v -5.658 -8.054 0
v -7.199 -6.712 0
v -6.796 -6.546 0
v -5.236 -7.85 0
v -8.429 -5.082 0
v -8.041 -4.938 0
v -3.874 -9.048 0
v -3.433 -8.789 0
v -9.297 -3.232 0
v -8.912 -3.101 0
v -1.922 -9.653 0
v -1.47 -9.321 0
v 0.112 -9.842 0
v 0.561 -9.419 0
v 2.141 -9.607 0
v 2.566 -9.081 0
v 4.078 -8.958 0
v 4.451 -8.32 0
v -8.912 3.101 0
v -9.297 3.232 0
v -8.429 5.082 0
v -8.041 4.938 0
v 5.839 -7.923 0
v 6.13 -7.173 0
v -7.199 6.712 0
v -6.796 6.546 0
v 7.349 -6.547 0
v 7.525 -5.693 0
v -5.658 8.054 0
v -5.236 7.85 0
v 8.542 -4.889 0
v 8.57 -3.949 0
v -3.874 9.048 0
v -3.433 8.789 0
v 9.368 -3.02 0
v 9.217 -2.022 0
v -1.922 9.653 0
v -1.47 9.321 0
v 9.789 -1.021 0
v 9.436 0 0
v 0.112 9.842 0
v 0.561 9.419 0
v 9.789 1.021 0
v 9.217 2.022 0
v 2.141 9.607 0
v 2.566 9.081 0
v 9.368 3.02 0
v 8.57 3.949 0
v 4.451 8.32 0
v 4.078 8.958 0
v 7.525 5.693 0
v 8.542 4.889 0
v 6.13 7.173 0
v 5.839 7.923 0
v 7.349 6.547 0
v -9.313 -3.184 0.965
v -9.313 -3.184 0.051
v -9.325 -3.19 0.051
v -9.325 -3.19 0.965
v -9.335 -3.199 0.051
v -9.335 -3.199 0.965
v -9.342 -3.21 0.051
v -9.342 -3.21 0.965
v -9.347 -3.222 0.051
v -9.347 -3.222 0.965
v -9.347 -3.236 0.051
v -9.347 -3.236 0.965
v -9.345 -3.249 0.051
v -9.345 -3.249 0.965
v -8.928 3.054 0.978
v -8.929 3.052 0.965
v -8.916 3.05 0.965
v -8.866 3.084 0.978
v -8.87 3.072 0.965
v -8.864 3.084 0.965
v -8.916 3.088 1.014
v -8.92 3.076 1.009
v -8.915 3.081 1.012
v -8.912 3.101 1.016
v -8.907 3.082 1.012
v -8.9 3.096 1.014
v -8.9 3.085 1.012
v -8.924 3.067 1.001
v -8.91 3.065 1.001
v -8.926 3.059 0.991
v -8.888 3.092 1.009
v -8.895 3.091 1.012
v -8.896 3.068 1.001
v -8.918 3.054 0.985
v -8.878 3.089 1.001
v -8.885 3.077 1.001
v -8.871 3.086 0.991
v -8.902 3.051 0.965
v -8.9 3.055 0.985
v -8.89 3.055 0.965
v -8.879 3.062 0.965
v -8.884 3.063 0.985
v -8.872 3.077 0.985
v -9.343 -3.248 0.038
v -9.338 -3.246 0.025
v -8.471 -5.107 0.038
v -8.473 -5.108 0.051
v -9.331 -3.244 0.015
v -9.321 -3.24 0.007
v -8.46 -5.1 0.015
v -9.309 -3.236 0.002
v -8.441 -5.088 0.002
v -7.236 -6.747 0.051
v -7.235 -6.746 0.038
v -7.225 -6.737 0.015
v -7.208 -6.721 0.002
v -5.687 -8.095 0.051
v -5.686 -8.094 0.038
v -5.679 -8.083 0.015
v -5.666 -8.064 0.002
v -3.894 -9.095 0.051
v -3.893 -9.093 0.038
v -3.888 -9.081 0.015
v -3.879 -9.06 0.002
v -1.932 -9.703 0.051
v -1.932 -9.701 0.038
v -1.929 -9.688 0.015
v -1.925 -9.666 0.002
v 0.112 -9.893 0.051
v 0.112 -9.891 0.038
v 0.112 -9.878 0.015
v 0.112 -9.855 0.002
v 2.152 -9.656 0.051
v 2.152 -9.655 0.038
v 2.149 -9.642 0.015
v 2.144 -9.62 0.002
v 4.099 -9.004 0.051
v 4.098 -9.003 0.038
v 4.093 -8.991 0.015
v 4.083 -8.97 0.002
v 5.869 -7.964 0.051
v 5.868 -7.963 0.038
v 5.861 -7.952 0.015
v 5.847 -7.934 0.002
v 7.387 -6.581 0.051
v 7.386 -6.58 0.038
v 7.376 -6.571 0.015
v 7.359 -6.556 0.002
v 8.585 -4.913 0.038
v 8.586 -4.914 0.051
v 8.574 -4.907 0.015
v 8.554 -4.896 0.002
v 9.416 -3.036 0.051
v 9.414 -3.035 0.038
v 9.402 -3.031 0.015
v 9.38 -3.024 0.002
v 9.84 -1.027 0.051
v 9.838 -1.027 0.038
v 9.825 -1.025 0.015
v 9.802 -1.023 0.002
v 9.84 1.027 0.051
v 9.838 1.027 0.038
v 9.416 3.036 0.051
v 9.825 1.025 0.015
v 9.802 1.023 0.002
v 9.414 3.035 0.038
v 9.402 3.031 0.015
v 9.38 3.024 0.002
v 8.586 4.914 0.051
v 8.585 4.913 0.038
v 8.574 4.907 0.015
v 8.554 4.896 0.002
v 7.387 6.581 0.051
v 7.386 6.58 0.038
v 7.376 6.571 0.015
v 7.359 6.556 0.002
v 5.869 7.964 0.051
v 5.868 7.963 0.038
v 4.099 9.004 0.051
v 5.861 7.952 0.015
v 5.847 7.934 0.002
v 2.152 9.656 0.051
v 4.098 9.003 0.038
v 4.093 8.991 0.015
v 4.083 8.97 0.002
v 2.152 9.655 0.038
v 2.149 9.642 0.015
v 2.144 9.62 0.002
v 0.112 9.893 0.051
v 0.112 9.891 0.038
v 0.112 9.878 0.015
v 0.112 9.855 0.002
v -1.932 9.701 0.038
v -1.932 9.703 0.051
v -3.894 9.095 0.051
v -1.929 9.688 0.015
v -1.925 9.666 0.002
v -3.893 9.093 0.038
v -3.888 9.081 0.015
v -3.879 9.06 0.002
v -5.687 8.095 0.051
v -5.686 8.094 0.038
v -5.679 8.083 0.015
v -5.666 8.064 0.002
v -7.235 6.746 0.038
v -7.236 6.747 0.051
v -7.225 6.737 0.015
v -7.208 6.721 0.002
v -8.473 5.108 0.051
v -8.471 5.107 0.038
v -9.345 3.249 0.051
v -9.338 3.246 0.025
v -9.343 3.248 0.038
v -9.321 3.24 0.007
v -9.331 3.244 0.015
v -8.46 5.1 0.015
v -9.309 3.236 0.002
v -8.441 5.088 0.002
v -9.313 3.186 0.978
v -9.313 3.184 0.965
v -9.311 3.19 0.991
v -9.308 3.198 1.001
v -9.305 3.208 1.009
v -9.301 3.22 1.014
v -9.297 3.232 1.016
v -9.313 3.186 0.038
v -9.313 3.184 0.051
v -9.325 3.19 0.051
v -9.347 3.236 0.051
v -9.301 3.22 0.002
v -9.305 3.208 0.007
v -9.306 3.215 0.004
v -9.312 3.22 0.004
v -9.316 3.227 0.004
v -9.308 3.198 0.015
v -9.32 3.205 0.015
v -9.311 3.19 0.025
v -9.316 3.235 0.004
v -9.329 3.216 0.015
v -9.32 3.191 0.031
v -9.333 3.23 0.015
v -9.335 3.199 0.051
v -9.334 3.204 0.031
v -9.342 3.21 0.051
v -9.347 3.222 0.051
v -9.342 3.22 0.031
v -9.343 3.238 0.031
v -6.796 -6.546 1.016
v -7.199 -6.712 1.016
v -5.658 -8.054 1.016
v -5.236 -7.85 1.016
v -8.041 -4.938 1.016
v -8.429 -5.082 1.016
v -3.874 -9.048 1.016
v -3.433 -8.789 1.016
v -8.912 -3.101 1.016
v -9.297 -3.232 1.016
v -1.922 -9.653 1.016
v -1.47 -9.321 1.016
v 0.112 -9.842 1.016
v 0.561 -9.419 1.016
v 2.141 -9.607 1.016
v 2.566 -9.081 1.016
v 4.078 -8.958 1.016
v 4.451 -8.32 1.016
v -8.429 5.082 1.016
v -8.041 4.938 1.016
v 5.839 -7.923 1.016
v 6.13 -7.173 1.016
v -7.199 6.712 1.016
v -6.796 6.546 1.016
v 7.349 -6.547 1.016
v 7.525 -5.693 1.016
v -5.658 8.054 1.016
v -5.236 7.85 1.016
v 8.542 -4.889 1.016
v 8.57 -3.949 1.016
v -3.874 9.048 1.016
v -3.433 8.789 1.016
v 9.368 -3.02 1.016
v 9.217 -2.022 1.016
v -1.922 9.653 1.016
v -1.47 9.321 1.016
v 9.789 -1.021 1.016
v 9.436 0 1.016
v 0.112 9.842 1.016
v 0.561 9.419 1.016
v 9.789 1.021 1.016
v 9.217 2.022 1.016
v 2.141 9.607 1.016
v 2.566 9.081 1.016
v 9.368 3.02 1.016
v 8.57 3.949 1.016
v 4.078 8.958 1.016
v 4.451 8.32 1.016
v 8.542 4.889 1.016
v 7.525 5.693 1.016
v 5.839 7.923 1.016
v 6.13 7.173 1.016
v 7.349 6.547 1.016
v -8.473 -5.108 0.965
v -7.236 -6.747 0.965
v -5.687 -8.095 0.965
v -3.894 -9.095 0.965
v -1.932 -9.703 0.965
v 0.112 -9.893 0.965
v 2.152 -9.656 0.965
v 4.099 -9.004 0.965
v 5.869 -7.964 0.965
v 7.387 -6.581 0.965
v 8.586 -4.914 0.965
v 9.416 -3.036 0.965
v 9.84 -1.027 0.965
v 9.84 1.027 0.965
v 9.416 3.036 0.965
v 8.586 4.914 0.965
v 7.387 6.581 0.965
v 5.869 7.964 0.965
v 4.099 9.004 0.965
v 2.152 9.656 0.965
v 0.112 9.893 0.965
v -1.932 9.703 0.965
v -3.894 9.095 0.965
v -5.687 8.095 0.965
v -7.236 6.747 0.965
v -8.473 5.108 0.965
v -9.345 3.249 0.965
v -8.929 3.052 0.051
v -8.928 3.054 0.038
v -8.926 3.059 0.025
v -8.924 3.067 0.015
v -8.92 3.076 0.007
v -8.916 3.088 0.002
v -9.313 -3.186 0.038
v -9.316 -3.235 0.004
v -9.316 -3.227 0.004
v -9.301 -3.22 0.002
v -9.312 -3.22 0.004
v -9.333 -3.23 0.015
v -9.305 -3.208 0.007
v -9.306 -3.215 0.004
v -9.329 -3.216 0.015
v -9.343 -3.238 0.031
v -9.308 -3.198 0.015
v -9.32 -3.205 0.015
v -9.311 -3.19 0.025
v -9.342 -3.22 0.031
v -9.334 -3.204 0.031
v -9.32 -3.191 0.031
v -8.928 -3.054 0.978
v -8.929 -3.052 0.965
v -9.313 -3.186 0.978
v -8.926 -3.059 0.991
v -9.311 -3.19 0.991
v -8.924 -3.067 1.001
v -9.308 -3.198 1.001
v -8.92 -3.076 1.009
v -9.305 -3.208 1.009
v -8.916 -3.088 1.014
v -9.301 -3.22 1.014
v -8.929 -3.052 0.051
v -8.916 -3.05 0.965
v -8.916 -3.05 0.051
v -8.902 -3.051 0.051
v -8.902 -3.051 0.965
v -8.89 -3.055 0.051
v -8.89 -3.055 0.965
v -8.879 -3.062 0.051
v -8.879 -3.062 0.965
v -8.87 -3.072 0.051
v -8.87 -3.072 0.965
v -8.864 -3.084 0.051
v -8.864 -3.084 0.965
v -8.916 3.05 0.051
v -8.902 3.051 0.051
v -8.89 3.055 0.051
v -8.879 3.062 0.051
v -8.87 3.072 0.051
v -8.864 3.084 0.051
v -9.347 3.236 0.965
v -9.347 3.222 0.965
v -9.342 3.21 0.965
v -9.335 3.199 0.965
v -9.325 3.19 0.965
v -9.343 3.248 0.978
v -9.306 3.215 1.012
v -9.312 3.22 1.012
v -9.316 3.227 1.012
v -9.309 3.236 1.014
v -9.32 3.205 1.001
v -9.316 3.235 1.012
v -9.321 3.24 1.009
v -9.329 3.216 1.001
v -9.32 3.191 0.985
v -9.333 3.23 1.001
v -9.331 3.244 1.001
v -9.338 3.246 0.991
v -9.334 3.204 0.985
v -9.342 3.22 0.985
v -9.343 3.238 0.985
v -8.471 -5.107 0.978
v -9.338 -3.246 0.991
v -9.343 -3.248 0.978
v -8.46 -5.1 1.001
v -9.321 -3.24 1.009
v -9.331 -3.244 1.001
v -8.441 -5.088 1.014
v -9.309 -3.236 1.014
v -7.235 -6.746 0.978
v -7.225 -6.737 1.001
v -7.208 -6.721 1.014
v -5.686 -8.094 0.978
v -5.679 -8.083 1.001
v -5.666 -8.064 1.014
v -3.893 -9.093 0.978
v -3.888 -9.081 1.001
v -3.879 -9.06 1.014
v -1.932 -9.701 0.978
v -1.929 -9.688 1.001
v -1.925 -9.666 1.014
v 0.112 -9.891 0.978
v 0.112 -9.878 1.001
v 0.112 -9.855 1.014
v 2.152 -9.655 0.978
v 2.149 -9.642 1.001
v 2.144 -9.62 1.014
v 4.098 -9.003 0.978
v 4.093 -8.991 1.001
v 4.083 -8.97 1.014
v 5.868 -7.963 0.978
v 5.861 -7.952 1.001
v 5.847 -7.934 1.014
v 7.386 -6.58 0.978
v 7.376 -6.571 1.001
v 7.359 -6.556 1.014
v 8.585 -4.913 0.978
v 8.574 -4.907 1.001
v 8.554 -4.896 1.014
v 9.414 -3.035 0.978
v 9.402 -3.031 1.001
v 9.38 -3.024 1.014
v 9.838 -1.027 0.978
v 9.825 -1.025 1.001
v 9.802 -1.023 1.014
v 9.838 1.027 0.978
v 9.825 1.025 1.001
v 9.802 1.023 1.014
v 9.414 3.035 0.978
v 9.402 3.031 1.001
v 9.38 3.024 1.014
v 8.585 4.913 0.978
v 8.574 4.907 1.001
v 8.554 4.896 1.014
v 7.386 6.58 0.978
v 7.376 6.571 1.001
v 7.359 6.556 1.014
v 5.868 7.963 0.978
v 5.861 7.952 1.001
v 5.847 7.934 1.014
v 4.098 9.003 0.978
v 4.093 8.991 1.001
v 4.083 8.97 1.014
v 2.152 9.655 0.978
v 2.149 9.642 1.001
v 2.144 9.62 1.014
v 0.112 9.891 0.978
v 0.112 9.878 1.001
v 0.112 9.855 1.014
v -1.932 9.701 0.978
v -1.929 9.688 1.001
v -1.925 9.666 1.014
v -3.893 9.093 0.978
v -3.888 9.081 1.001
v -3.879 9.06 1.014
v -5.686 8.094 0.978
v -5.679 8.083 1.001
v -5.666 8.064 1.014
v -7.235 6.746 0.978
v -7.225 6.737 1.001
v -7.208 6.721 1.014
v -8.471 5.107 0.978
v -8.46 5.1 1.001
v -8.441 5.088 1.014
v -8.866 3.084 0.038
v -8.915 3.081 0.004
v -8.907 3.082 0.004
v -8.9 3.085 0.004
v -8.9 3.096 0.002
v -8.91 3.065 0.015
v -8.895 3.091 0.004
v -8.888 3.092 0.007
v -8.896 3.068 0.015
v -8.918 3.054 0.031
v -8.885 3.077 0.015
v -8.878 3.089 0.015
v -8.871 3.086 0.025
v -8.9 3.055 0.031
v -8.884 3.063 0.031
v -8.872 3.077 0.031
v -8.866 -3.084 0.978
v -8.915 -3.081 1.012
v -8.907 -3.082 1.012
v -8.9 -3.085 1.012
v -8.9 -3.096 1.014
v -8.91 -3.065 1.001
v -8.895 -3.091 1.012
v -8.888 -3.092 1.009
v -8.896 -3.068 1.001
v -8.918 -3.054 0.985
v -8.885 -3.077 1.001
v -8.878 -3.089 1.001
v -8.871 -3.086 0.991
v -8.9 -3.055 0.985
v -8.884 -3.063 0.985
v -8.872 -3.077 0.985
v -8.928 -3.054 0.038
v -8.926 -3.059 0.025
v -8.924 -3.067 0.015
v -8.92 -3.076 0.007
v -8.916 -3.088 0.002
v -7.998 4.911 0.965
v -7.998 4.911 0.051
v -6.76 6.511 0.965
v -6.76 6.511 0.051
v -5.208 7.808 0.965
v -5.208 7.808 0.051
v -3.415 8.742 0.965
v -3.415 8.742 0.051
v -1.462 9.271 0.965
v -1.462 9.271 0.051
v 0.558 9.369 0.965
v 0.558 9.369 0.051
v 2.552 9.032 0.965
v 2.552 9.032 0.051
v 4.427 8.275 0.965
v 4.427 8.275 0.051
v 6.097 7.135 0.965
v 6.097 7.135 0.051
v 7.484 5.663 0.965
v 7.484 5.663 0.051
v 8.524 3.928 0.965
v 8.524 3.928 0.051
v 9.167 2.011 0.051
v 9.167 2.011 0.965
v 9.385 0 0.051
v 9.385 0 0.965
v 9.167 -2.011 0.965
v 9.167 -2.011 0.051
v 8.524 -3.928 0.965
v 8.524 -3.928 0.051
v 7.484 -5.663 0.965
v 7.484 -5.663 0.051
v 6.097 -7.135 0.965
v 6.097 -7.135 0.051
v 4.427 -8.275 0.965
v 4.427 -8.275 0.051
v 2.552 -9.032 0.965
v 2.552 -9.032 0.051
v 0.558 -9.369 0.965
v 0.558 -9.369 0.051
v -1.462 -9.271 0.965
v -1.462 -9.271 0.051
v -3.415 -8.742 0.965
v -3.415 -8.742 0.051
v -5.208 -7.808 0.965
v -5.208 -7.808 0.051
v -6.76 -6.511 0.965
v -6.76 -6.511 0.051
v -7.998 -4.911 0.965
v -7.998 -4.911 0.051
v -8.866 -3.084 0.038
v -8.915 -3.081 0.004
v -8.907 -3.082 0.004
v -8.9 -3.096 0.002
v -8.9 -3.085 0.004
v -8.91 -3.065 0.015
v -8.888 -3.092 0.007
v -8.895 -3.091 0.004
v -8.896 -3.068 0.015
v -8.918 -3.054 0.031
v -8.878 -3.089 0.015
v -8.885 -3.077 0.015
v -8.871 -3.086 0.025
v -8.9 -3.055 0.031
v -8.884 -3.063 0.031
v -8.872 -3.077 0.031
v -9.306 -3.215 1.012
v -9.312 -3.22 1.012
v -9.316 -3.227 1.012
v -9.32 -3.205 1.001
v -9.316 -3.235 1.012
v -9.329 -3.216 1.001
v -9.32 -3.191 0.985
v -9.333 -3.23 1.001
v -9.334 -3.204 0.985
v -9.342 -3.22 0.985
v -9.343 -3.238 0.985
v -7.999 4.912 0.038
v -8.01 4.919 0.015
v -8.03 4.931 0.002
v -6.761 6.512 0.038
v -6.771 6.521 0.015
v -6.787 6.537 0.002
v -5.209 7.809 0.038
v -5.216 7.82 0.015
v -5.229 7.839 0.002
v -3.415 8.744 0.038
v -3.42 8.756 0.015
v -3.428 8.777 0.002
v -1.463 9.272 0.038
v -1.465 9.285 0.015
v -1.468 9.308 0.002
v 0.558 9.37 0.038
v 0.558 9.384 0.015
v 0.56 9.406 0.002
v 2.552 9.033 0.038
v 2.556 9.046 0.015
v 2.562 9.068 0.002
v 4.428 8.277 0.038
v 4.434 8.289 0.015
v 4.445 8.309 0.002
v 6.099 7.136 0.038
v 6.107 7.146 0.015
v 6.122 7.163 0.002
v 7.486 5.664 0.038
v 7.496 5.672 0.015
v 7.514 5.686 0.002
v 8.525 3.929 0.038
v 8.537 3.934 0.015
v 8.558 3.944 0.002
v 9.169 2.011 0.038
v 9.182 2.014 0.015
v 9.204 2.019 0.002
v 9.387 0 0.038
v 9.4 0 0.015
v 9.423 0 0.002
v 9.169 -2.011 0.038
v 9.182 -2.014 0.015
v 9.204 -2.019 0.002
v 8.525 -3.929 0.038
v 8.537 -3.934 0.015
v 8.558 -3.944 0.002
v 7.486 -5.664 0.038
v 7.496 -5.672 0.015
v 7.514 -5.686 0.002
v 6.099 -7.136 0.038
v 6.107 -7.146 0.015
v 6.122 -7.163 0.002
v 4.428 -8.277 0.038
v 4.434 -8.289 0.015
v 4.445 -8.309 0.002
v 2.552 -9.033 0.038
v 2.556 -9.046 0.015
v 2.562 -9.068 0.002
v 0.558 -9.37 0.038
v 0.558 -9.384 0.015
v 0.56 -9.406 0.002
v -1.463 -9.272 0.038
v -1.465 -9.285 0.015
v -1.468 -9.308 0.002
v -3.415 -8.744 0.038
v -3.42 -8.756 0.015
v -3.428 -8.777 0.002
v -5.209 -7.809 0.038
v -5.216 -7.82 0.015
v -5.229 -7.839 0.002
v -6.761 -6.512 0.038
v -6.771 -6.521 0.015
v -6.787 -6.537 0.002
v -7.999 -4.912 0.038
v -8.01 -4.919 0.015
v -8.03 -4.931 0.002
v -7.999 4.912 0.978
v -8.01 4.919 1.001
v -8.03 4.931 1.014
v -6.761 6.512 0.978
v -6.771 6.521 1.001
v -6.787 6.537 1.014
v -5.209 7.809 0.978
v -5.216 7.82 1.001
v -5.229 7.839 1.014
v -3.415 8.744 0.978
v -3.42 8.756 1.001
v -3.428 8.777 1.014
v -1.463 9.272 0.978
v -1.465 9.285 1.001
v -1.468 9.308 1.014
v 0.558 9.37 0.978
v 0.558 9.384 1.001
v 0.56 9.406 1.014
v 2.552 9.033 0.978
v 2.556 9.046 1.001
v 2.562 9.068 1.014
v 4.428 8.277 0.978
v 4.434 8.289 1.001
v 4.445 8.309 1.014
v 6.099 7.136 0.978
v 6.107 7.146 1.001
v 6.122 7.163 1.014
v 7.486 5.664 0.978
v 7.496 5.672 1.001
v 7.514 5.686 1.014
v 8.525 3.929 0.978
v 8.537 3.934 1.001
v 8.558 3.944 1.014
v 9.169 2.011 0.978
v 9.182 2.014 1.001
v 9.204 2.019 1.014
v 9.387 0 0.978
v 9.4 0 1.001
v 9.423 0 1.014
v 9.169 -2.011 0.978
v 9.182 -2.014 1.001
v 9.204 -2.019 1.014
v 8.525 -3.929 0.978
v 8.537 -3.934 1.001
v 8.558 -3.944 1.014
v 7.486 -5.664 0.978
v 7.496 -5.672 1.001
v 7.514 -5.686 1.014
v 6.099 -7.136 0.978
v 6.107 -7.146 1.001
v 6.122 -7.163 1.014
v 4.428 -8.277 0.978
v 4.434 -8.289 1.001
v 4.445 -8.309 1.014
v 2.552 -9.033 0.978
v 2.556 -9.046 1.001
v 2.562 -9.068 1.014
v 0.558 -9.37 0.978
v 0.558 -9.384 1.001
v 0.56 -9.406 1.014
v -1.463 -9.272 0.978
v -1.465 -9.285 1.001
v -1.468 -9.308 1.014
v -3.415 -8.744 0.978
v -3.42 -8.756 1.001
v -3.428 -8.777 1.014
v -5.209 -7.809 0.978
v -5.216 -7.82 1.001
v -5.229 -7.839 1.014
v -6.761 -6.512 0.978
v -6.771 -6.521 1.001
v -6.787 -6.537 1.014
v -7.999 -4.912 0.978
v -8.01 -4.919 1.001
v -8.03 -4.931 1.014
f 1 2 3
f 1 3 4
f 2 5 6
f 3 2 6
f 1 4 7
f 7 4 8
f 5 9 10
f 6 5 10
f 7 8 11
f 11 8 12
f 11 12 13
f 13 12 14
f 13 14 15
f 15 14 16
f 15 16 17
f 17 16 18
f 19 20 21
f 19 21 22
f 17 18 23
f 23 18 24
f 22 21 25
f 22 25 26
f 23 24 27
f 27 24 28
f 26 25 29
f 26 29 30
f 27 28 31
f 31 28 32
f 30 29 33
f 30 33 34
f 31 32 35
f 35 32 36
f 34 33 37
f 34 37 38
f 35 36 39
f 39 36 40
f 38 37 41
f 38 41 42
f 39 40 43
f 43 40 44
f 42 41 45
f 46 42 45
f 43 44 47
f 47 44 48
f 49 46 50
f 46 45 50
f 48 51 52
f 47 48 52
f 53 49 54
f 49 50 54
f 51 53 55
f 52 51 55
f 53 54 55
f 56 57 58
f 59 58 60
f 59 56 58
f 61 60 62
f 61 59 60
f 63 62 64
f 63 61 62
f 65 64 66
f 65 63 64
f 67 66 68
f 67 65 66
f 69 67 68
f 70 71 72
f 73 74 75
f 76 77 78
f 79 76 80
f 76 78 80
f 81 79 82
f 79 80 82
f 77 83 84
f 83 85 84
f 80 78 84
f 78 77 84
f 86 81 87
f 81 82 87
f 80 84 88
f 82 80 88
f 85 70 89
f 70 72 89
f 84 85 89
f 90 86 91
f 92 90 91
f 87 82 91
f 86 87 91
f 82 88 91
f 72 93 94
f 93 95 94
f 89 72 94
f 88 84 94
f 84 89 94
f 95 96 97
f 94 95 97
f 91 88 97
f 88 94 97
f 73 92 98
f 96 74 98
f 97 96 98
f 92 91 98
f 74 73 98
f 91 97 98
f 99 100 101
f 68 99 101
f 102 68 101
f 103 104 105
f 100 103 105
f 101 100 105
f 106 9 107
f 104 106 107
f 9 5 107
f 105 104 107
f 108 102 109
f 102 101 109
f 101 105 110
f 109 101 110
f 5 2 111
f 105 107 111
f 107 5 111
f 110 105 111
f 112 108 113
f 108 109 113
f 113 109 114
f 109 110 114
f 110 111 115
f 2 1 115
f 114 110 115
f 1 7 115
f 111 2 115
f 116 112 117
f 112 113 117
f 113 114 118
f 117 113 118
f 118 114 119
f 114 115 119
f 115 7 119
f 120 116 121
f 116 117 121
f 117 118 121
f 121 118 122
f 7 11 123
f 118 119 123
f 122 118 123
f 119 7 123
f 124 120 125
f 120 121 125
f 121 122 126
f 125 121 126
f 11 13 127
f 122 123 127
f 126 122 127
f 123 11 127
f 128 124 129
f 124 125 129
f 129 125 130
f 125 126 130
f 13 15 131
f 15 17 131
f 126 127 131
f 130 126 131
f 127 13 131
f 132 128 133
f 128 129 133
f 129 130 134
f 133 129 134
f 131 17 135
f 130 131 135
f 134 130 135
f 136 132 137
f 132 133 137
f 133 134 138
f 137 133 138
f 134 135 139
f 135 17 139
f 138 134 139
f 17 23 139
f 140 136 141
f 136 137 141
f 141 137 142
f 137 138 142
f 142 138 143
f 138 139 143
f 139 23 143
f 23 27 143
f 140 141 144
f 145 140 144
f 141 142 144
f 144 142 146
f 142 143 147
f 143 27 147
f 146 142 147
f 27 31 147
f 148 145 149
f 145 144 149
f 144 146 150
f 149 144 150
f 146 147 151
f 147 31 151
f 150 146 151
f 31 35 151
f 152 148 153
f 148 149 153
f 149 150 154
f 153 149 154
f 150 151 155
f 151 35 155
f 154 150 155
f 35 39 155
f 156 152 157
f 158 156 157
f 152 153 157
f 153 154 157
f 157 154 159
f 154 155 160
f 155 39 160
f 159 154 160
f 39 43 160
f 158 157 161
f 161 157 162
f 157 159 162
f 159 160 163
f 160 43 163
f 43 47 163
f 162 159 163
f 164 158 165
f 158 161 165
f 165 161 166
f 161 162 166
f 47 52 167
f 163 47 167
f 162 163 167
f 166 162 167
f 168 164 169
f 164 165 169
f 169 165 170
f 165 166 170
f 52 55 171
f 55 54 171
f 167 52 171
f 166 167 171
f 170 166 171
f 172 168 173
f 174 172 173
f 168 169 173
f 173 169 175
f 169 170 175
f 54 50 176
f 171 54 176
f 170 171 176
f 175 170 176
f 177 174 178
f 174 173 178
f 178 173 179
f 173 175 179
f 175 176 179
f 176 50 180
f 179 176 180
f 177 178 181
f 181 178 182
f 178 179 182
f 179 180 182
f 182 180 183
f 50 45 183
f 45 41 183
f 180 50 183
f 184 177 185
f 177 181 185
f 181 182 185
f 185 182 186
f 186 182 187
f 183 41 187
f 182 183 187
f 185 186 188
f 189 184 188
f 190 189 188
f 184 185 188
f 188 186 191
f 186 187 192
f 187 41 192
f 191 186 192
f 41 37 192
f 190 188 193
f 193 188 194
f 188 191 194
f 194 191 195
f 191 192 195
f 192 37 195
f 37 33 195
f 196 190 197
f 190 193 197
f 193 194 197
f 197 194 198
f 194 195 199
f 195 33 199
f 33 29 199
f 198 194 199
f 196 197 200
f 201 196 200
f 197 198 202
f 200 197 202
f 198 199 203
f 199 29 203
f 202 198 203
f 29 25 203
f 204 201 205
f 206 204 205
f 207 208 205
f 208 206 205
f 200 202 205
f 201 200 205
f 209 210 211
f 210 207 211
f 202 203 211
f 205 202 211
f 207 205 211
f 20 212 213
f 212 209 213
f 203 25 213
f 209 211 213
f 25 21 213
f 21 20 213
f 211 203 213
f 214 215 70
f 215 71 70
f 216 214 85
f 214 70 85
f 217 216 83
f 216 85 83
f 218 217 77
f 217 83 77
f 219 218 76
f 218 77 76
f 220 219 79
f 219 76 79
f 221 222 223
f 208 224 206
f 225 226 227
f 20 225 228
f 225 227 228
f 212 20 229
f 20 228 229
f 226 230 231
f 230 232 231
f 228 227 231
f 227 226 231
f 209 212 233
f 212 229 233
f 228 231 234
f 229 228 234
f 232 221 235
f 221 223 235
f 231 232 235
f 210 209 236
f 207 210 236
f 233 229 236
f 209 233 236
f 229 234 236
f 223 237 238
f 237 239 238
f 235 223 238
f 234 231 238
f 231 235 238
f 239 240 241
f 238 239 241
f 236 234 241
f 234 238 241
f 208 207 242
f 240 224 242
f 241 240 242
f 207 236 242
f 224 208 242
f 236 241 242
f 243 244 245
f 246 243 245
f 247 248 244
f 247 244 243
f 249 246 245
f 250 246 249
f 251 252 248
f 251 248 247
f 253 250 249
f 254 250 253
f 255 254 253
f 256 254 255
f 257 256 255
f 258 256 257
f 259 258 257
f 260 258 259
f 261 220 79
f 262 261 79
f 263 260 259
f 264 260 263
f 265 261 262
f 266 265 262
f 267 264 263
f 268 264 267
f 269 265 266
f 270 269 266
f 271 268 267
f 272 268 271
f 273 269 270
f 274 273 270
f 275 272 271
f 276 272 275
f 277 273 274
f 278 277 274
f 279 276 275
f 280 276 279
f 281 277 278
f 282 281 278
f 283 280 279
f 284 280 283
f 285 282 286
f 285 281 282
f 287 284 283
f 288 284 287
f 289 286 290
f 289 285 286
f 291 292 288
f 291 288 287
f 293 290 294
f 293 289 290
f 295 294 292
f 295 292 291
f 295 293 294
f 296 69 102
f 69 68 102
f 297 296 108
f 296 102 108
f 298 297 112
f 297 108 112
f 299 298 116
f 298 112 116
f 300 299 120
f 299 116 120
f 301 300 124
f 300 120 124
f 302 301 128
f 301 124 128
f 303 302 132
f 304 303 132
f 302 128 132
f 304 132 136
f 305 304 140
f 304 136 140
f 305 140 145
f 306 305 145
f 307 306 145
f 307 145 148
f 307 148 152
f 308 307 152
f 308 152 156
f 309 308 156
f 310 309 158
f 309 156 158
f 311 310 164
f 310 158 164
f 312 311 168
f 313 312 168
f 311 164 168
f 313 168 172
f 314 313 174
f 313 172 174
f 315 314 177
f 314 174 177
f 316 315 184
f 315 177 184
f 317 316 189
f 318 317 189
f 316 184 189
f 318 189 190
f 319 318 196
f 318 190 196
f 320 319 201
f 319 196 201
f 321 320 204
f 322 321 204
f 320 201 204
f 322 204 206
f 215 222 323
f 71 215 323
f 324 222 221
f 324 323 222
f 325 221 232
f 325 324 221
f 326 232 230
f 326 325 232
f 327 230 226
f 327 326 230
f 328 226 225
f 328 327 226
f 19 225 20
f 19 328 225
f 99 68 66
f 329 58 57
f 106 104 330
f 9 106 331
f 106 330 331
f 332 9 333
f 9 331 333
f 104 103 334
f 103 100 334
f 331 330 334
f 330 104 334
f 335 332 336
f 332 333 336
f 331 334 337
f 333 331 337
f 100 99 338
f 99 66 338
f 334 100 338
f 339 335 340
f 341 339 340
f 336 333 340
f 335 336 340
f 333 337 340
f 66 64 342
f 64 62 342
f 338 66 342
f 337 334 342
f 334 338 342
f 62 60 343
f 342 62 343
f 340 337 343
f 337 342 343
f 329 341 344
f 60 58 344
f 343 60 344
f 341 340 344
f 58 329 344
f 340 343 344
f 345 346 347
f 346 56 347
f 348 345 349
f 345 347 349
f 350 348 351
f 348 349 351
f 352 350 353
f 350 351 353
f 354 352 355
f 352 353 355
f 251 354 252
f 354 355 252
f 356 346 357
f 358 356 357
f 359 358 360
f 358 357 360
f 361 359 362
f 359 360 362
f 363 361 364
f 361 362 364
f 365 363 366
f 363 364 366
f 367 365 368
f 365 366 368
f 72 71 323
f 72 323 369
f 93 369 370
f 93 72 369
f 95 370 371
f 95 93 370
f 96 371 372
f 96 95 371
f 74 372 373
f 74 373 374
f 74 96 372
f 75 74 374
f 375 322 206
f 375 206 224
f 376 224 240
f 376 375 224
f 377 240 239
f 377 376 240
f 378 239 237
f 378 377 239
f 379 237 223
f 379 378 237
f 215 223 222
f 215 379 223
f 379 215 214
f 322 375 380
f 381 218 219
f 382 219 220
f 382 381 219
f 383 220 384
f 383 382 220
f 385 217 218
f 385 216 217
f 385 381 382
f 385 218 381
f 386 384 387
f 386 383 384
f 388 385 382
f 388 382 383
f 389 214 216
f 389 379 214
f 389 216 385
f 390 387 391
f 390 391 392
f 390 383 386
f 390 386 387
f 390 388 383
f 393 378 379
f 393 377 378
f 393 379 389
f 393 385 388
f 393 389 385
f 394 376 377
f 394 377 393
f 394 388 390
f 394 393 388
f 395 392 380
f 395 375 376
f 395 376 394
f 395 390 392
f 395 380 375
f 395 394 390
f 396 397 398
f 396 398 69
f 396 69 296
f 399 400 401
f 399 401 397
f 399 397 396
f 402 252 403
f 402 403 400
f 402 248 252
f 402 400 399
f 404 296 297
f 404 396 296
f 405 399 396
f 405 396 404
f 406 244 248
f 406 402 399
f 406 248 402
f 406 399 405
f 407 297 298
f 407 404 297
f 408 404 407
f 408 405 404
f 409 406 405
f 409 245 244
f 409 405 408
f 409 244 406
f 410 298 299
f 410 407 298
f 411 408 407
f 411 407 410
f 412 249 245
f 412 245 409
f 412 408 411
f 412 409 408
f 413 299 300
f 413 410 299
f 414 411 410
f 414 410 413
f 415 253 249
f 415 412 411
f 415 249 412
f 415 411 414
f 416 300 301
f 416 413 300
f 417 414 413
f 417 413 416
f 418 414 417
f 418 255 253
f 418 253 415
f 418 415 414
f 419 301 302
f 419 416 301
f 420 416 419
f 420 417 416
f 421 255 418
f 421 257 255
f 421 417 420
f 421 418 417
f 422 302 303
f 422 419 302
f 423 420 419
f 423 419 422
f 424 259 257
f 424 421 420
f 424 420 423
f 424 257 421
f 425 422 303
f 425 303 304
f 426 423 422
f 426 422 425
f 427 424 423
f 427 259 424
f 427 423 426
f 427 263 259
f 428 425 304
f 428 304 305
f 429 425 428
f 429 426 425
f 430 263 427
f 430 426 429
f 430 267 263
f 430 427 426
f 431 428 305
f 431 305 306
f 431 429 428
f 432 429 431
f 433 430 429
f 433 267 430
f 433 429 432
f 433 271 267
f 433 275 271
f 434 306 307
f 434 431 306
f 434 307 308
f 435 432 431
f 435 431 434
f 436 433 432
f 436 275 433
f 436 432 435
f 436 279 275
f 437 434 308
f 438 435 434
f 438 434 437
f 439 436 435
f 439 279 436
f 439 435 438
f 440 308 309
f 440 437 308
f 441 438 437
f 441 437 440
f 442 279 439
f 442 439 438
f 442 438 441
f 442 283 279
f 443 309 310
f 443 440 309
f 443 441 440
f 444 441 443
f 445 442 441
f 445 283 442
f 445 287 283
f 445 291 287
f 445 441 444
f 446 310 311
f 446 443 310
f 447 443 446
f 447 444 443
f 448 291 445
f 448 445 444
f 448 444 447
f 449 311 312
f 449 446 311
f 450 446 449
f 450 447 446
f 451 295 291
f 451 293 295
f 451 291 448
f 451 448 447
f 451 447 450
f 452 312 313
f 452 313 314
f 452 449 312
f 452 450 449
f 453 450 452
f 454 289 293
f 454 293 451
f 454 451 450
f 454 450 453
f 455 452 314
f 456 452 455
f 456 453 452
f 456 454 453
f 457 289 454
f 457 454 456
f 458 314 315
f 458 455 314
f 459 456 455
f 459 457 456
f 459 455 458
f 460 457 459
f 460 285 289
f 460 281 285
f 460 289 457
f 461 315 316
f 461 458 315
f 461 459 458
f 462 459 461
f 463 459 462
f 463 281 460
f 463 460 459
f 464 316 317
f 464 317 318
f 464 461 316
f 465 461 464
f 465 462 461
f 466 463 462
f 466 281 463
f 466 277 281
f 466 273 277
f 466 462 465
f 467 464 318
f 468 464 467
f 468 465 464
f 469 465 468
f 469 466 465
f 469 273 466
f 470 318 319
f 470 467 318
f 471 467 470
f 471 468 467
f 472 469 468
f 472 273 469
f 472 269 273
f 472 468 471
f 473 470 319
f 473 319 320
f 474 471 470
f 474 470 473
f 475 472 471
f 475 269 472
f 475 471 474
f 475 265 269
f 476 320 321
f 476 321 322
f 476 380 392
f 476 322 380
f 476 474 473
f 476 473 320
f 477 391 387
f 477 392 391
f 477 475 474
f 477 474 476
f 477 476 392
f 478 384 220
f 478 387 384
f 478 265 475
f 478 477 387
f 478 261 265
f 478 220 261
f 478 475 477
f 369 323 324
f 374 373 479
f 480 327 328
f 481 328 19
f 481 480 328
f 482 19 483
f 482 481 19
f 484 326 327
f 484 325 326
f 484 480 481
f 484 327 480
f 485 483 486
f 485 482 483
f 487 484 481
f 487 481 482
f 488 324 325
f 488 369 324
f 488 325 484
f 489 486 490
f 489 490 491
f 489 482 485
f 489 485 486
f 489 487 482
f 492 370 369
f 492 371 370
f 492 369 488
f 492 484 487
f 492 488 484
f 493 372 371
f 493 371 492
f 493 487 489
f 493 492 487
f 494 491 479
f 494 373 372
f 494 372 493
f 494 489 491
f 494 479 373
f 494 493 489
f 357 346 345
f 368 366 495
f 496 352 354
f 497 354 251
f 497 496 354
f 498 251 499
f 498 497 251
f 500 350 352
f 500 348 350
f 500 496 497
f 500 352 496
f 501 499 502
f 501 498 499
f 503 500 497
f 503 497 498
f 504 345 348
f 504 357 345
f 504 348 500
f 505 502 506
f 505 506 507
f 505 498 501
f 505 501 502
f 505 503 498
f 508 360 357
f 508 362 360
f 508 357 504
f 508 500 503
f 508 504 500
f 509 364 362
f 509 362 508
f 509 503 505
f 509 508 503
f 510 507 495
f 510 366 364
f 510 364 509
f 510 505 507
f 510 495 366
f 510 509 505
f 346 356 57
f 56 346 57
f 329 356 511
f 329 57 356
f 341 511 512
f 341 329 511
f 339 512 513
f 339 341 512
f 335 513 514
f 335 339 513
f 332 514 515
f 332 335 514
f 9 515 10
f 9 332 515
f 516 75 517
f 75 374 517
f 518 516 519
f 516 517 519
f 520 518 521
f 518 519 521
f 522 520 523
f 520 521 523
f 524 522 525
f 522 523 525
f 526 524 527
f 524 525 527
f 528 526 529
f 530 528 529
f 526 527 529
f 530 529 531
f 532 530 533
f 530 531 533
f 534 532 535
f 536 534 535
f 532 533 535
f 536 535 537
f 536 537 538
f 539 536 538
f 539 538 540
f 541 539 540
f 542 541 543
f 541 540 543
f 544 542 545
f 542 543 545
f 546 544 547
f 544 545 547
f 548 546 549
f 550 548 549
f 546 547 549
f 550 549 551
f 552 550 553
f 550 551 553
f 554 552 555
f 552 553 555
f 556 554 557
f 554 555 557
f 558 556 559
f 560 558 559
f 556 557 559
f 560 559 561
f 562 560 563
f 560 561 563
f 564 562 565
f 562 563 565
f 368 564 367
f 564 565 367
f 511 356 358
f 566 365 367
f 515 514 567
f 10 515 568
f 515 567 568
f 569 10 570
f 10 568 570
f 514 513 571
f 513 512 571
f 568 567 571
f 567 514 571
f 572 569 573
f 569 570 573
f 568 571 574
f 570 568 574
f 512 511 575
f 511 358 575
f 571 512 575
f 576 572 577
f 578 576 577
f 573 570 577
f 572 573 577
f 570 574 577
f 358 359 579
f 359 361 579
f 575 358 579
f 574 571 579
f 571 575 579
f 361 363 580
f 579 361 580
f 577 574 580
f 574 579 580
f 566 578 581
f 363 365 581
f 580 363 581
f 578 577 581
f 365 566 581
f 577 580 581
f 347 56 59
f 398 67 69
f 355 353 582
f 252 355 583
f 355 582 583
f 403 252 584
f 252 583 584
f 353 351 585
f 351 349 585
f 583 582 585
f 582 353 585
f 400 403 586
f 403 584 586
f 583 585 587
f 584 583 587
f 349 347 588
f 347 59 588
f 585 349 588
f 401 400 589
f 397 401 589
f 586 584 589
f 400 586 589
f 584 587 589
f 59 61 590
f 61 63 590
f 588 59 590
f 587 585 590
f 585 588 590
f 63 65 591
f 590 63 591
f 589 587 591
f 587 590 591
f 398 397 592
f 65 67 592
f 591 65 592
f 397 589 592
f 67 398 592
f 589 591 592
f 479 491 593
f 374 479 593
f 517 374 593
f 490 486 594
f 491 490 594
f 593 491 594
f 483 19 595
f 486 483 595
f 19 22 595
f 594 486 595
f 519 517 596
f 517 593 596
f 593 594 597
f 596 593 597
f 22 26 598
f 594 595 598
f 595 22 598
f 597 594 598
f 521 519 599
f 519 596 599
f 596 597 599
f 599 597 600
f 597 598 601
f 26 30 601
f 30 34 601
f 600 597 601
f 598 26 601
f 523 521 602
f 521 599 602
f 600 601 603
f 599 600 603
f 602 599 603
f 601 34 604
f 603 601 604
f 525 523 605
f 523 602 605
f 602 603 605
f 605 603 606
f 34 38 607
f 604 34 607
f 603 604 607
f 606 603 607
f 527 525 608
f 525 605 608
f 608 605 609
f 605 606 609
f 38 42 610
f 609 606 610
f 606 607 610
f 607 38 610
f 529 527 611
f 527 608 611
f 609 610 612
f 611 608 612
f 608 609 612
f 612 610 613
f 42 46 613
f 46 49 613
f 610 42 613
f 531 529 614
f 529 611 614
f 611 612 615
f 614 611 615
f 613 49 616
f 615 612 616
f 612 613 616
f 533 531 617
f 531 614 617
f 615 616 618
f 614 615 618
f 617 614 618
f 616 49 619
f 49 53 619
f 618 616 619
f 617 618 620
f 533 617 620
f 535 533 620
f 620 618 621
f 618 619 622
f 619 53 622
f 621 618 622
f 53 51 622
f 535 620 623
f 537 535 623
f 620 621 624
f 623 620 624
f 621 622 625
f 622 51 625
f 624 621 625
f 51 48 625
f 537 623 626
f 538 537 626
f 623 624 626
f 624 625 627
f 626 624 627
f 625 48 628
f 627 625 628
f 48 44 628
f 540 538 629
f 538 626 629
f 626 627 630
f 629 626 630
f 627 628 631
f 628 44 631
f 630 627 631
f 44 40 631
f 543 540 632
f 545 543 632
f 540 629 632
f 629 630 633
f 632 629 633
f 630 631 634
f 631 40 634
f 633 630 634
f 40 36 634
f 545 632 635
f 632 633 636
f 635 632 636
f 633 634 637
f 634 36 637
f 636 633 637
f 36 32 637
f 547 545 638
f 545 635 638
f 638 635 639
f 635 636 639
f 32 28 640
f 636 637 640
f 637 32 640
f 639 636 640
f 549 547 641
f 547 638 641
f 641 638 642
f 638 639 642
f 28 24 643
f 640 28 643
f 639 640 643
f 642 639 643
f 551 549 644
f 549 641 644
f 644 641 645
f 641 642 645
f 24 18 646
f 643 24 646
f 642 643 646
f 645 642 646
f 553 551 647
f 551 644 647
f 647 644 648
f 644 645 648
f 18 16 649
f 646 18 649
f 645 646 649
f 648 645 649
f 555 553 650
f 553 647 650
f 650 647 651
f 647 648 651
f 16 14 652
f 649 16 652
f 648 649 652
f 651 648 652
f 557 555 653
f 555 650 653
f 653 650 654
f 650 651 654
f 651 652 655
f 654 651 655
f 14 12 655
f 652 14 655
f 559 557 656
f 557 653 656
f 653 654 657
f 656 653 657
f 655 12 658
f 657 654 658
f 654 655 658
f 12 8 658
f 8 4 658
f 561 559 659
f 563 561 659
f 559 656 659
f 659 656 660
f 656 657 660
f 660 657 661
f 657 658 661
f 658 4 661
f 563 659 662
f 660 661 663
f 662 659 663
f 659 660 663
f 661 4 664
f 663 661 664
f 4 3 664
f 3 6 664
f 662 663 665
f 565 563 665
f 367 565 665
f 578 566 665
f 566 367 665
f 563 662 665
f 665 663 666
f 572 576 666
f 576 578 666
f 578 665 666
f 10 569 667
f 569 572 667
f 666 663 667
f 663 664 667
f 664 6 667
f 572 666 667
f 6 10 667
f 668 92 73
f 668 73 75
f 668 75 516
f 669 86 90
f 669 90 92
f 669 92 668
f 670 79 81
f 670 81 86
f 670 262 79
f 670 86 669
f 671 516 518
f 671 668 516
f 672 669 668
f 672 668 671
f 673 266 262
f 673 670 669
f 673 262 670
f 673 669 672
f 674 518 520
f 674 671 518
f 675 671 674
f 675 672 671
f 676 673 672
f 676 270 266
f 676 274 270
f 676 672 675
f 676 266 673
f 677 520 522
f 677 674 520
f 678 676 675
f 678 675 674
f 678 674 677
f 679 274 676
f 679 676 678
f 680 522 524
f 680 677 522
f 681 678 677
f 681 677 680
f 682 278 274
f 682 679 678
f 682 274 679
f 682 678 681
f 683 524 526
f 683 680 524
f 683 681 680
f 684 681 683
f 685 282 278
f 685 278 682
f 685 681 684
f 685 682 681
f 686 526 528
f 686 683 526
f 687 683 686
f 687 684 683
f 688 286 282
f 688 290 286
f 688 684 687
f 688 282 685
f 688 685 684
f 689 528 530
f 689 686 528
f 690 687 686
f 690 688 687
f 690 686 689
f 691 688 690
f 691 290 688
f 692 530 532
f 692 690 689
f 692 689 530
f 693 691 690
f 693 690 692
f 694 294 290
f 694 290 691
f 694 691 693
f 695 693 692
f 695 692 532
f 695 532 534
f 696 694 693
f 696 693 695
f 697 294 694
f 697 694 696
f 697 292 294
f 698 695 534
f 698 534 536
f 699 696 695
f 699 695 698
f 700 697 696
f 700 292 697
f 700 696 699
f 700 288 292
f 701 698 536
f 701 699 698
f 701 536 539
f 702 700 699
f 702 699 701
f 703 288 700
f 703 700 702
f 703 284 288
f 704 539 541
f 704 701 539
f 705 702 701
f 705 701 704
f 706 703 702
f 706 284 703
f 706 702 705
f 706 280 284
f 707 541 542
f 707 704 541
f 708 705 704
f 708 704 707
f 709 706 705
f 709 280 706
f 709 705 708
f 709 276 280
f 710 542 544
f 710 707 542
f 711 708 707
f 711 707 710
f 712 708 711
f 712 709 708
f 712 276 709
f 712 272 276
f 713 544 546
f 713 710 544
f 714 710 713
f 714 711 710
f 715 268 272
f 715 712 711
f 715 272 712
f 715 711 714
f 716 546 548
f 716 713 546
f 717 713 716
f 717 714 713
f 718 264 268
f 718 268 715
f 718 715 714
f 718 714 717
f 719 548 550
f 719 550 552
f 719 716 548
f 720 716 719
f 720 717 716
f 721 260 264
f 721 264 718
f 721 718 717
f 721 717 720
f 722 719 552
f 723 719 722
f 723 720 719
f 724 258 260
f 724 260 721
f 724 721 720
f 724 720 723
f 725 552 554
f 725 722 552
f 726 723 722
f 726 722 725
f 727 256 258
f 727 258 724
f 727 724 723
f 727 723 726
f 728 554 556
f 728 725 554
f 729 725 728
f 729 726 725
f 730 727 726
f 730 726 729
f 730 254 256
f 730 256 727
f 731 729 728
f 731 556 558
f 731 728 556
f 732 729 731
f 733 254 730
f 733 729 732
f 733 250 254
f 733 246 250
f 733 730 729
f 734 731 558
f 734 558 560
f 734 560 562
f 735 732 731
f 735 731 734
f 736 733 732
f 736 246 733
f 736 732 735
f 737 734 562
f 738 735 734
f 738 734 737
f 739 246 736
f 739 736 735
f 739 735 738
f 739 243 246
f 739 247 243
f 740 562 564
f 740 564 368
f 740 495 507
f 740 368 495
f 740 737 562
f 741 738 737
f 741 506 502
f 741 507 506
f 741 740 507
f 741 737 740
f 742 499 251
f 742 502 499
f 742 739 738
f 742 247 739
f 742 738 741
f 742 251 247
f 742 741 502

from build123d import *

# Parameters (mm, degrees)
F1_DEPTH = 1.016
F2_R     = 0.0508


with BuildPart() as f1:
    # F0 (on Top) → F1 (new body)
    with BuildSketch(Plane.XY):
        with BuildLine():
            Line((-8.880662, -3.036066), (-9.361347, -3.2004))
            ThreePointArc((-9.361347, -3.2004), (9.8933, 0), (-9.361347, 3.2004))
            Line((-9.361347, 3.2004), (-8.880662, 3.036066))
            ThreePointArc((-8.880662, 3.036066), (9.3853, 0), (-8.880662, -3.036066))
        make_face()
    extrude(amount=F1_DEPTH)

    # F2
    f2_edges = [f1.edges().sort_by_distance(p)[0] for p in [
        (9.3853, 0, 1.016),
        (9.8933, 0, 1.016),
        (9.8933, 0, 0),
        (9.3853, 0, 0),
        (-8.880662, -3.036066, 0.508),
        (-8.880662, 3.036066, 0.508),
        (-9.361347, 3.2004, 0.508),
        (-9.121005, 3.118233, 0),
        (-9.121005, 3.118233, 1.016),
        (-9.121005, -3.118233, 0),
        (-9.361347, -3.2004, 0.508),
        (-9.121005, -3.118233, 1.016),
    ]]
    fillet(f2_edges, radius=F2_R)


solid = f1.part
